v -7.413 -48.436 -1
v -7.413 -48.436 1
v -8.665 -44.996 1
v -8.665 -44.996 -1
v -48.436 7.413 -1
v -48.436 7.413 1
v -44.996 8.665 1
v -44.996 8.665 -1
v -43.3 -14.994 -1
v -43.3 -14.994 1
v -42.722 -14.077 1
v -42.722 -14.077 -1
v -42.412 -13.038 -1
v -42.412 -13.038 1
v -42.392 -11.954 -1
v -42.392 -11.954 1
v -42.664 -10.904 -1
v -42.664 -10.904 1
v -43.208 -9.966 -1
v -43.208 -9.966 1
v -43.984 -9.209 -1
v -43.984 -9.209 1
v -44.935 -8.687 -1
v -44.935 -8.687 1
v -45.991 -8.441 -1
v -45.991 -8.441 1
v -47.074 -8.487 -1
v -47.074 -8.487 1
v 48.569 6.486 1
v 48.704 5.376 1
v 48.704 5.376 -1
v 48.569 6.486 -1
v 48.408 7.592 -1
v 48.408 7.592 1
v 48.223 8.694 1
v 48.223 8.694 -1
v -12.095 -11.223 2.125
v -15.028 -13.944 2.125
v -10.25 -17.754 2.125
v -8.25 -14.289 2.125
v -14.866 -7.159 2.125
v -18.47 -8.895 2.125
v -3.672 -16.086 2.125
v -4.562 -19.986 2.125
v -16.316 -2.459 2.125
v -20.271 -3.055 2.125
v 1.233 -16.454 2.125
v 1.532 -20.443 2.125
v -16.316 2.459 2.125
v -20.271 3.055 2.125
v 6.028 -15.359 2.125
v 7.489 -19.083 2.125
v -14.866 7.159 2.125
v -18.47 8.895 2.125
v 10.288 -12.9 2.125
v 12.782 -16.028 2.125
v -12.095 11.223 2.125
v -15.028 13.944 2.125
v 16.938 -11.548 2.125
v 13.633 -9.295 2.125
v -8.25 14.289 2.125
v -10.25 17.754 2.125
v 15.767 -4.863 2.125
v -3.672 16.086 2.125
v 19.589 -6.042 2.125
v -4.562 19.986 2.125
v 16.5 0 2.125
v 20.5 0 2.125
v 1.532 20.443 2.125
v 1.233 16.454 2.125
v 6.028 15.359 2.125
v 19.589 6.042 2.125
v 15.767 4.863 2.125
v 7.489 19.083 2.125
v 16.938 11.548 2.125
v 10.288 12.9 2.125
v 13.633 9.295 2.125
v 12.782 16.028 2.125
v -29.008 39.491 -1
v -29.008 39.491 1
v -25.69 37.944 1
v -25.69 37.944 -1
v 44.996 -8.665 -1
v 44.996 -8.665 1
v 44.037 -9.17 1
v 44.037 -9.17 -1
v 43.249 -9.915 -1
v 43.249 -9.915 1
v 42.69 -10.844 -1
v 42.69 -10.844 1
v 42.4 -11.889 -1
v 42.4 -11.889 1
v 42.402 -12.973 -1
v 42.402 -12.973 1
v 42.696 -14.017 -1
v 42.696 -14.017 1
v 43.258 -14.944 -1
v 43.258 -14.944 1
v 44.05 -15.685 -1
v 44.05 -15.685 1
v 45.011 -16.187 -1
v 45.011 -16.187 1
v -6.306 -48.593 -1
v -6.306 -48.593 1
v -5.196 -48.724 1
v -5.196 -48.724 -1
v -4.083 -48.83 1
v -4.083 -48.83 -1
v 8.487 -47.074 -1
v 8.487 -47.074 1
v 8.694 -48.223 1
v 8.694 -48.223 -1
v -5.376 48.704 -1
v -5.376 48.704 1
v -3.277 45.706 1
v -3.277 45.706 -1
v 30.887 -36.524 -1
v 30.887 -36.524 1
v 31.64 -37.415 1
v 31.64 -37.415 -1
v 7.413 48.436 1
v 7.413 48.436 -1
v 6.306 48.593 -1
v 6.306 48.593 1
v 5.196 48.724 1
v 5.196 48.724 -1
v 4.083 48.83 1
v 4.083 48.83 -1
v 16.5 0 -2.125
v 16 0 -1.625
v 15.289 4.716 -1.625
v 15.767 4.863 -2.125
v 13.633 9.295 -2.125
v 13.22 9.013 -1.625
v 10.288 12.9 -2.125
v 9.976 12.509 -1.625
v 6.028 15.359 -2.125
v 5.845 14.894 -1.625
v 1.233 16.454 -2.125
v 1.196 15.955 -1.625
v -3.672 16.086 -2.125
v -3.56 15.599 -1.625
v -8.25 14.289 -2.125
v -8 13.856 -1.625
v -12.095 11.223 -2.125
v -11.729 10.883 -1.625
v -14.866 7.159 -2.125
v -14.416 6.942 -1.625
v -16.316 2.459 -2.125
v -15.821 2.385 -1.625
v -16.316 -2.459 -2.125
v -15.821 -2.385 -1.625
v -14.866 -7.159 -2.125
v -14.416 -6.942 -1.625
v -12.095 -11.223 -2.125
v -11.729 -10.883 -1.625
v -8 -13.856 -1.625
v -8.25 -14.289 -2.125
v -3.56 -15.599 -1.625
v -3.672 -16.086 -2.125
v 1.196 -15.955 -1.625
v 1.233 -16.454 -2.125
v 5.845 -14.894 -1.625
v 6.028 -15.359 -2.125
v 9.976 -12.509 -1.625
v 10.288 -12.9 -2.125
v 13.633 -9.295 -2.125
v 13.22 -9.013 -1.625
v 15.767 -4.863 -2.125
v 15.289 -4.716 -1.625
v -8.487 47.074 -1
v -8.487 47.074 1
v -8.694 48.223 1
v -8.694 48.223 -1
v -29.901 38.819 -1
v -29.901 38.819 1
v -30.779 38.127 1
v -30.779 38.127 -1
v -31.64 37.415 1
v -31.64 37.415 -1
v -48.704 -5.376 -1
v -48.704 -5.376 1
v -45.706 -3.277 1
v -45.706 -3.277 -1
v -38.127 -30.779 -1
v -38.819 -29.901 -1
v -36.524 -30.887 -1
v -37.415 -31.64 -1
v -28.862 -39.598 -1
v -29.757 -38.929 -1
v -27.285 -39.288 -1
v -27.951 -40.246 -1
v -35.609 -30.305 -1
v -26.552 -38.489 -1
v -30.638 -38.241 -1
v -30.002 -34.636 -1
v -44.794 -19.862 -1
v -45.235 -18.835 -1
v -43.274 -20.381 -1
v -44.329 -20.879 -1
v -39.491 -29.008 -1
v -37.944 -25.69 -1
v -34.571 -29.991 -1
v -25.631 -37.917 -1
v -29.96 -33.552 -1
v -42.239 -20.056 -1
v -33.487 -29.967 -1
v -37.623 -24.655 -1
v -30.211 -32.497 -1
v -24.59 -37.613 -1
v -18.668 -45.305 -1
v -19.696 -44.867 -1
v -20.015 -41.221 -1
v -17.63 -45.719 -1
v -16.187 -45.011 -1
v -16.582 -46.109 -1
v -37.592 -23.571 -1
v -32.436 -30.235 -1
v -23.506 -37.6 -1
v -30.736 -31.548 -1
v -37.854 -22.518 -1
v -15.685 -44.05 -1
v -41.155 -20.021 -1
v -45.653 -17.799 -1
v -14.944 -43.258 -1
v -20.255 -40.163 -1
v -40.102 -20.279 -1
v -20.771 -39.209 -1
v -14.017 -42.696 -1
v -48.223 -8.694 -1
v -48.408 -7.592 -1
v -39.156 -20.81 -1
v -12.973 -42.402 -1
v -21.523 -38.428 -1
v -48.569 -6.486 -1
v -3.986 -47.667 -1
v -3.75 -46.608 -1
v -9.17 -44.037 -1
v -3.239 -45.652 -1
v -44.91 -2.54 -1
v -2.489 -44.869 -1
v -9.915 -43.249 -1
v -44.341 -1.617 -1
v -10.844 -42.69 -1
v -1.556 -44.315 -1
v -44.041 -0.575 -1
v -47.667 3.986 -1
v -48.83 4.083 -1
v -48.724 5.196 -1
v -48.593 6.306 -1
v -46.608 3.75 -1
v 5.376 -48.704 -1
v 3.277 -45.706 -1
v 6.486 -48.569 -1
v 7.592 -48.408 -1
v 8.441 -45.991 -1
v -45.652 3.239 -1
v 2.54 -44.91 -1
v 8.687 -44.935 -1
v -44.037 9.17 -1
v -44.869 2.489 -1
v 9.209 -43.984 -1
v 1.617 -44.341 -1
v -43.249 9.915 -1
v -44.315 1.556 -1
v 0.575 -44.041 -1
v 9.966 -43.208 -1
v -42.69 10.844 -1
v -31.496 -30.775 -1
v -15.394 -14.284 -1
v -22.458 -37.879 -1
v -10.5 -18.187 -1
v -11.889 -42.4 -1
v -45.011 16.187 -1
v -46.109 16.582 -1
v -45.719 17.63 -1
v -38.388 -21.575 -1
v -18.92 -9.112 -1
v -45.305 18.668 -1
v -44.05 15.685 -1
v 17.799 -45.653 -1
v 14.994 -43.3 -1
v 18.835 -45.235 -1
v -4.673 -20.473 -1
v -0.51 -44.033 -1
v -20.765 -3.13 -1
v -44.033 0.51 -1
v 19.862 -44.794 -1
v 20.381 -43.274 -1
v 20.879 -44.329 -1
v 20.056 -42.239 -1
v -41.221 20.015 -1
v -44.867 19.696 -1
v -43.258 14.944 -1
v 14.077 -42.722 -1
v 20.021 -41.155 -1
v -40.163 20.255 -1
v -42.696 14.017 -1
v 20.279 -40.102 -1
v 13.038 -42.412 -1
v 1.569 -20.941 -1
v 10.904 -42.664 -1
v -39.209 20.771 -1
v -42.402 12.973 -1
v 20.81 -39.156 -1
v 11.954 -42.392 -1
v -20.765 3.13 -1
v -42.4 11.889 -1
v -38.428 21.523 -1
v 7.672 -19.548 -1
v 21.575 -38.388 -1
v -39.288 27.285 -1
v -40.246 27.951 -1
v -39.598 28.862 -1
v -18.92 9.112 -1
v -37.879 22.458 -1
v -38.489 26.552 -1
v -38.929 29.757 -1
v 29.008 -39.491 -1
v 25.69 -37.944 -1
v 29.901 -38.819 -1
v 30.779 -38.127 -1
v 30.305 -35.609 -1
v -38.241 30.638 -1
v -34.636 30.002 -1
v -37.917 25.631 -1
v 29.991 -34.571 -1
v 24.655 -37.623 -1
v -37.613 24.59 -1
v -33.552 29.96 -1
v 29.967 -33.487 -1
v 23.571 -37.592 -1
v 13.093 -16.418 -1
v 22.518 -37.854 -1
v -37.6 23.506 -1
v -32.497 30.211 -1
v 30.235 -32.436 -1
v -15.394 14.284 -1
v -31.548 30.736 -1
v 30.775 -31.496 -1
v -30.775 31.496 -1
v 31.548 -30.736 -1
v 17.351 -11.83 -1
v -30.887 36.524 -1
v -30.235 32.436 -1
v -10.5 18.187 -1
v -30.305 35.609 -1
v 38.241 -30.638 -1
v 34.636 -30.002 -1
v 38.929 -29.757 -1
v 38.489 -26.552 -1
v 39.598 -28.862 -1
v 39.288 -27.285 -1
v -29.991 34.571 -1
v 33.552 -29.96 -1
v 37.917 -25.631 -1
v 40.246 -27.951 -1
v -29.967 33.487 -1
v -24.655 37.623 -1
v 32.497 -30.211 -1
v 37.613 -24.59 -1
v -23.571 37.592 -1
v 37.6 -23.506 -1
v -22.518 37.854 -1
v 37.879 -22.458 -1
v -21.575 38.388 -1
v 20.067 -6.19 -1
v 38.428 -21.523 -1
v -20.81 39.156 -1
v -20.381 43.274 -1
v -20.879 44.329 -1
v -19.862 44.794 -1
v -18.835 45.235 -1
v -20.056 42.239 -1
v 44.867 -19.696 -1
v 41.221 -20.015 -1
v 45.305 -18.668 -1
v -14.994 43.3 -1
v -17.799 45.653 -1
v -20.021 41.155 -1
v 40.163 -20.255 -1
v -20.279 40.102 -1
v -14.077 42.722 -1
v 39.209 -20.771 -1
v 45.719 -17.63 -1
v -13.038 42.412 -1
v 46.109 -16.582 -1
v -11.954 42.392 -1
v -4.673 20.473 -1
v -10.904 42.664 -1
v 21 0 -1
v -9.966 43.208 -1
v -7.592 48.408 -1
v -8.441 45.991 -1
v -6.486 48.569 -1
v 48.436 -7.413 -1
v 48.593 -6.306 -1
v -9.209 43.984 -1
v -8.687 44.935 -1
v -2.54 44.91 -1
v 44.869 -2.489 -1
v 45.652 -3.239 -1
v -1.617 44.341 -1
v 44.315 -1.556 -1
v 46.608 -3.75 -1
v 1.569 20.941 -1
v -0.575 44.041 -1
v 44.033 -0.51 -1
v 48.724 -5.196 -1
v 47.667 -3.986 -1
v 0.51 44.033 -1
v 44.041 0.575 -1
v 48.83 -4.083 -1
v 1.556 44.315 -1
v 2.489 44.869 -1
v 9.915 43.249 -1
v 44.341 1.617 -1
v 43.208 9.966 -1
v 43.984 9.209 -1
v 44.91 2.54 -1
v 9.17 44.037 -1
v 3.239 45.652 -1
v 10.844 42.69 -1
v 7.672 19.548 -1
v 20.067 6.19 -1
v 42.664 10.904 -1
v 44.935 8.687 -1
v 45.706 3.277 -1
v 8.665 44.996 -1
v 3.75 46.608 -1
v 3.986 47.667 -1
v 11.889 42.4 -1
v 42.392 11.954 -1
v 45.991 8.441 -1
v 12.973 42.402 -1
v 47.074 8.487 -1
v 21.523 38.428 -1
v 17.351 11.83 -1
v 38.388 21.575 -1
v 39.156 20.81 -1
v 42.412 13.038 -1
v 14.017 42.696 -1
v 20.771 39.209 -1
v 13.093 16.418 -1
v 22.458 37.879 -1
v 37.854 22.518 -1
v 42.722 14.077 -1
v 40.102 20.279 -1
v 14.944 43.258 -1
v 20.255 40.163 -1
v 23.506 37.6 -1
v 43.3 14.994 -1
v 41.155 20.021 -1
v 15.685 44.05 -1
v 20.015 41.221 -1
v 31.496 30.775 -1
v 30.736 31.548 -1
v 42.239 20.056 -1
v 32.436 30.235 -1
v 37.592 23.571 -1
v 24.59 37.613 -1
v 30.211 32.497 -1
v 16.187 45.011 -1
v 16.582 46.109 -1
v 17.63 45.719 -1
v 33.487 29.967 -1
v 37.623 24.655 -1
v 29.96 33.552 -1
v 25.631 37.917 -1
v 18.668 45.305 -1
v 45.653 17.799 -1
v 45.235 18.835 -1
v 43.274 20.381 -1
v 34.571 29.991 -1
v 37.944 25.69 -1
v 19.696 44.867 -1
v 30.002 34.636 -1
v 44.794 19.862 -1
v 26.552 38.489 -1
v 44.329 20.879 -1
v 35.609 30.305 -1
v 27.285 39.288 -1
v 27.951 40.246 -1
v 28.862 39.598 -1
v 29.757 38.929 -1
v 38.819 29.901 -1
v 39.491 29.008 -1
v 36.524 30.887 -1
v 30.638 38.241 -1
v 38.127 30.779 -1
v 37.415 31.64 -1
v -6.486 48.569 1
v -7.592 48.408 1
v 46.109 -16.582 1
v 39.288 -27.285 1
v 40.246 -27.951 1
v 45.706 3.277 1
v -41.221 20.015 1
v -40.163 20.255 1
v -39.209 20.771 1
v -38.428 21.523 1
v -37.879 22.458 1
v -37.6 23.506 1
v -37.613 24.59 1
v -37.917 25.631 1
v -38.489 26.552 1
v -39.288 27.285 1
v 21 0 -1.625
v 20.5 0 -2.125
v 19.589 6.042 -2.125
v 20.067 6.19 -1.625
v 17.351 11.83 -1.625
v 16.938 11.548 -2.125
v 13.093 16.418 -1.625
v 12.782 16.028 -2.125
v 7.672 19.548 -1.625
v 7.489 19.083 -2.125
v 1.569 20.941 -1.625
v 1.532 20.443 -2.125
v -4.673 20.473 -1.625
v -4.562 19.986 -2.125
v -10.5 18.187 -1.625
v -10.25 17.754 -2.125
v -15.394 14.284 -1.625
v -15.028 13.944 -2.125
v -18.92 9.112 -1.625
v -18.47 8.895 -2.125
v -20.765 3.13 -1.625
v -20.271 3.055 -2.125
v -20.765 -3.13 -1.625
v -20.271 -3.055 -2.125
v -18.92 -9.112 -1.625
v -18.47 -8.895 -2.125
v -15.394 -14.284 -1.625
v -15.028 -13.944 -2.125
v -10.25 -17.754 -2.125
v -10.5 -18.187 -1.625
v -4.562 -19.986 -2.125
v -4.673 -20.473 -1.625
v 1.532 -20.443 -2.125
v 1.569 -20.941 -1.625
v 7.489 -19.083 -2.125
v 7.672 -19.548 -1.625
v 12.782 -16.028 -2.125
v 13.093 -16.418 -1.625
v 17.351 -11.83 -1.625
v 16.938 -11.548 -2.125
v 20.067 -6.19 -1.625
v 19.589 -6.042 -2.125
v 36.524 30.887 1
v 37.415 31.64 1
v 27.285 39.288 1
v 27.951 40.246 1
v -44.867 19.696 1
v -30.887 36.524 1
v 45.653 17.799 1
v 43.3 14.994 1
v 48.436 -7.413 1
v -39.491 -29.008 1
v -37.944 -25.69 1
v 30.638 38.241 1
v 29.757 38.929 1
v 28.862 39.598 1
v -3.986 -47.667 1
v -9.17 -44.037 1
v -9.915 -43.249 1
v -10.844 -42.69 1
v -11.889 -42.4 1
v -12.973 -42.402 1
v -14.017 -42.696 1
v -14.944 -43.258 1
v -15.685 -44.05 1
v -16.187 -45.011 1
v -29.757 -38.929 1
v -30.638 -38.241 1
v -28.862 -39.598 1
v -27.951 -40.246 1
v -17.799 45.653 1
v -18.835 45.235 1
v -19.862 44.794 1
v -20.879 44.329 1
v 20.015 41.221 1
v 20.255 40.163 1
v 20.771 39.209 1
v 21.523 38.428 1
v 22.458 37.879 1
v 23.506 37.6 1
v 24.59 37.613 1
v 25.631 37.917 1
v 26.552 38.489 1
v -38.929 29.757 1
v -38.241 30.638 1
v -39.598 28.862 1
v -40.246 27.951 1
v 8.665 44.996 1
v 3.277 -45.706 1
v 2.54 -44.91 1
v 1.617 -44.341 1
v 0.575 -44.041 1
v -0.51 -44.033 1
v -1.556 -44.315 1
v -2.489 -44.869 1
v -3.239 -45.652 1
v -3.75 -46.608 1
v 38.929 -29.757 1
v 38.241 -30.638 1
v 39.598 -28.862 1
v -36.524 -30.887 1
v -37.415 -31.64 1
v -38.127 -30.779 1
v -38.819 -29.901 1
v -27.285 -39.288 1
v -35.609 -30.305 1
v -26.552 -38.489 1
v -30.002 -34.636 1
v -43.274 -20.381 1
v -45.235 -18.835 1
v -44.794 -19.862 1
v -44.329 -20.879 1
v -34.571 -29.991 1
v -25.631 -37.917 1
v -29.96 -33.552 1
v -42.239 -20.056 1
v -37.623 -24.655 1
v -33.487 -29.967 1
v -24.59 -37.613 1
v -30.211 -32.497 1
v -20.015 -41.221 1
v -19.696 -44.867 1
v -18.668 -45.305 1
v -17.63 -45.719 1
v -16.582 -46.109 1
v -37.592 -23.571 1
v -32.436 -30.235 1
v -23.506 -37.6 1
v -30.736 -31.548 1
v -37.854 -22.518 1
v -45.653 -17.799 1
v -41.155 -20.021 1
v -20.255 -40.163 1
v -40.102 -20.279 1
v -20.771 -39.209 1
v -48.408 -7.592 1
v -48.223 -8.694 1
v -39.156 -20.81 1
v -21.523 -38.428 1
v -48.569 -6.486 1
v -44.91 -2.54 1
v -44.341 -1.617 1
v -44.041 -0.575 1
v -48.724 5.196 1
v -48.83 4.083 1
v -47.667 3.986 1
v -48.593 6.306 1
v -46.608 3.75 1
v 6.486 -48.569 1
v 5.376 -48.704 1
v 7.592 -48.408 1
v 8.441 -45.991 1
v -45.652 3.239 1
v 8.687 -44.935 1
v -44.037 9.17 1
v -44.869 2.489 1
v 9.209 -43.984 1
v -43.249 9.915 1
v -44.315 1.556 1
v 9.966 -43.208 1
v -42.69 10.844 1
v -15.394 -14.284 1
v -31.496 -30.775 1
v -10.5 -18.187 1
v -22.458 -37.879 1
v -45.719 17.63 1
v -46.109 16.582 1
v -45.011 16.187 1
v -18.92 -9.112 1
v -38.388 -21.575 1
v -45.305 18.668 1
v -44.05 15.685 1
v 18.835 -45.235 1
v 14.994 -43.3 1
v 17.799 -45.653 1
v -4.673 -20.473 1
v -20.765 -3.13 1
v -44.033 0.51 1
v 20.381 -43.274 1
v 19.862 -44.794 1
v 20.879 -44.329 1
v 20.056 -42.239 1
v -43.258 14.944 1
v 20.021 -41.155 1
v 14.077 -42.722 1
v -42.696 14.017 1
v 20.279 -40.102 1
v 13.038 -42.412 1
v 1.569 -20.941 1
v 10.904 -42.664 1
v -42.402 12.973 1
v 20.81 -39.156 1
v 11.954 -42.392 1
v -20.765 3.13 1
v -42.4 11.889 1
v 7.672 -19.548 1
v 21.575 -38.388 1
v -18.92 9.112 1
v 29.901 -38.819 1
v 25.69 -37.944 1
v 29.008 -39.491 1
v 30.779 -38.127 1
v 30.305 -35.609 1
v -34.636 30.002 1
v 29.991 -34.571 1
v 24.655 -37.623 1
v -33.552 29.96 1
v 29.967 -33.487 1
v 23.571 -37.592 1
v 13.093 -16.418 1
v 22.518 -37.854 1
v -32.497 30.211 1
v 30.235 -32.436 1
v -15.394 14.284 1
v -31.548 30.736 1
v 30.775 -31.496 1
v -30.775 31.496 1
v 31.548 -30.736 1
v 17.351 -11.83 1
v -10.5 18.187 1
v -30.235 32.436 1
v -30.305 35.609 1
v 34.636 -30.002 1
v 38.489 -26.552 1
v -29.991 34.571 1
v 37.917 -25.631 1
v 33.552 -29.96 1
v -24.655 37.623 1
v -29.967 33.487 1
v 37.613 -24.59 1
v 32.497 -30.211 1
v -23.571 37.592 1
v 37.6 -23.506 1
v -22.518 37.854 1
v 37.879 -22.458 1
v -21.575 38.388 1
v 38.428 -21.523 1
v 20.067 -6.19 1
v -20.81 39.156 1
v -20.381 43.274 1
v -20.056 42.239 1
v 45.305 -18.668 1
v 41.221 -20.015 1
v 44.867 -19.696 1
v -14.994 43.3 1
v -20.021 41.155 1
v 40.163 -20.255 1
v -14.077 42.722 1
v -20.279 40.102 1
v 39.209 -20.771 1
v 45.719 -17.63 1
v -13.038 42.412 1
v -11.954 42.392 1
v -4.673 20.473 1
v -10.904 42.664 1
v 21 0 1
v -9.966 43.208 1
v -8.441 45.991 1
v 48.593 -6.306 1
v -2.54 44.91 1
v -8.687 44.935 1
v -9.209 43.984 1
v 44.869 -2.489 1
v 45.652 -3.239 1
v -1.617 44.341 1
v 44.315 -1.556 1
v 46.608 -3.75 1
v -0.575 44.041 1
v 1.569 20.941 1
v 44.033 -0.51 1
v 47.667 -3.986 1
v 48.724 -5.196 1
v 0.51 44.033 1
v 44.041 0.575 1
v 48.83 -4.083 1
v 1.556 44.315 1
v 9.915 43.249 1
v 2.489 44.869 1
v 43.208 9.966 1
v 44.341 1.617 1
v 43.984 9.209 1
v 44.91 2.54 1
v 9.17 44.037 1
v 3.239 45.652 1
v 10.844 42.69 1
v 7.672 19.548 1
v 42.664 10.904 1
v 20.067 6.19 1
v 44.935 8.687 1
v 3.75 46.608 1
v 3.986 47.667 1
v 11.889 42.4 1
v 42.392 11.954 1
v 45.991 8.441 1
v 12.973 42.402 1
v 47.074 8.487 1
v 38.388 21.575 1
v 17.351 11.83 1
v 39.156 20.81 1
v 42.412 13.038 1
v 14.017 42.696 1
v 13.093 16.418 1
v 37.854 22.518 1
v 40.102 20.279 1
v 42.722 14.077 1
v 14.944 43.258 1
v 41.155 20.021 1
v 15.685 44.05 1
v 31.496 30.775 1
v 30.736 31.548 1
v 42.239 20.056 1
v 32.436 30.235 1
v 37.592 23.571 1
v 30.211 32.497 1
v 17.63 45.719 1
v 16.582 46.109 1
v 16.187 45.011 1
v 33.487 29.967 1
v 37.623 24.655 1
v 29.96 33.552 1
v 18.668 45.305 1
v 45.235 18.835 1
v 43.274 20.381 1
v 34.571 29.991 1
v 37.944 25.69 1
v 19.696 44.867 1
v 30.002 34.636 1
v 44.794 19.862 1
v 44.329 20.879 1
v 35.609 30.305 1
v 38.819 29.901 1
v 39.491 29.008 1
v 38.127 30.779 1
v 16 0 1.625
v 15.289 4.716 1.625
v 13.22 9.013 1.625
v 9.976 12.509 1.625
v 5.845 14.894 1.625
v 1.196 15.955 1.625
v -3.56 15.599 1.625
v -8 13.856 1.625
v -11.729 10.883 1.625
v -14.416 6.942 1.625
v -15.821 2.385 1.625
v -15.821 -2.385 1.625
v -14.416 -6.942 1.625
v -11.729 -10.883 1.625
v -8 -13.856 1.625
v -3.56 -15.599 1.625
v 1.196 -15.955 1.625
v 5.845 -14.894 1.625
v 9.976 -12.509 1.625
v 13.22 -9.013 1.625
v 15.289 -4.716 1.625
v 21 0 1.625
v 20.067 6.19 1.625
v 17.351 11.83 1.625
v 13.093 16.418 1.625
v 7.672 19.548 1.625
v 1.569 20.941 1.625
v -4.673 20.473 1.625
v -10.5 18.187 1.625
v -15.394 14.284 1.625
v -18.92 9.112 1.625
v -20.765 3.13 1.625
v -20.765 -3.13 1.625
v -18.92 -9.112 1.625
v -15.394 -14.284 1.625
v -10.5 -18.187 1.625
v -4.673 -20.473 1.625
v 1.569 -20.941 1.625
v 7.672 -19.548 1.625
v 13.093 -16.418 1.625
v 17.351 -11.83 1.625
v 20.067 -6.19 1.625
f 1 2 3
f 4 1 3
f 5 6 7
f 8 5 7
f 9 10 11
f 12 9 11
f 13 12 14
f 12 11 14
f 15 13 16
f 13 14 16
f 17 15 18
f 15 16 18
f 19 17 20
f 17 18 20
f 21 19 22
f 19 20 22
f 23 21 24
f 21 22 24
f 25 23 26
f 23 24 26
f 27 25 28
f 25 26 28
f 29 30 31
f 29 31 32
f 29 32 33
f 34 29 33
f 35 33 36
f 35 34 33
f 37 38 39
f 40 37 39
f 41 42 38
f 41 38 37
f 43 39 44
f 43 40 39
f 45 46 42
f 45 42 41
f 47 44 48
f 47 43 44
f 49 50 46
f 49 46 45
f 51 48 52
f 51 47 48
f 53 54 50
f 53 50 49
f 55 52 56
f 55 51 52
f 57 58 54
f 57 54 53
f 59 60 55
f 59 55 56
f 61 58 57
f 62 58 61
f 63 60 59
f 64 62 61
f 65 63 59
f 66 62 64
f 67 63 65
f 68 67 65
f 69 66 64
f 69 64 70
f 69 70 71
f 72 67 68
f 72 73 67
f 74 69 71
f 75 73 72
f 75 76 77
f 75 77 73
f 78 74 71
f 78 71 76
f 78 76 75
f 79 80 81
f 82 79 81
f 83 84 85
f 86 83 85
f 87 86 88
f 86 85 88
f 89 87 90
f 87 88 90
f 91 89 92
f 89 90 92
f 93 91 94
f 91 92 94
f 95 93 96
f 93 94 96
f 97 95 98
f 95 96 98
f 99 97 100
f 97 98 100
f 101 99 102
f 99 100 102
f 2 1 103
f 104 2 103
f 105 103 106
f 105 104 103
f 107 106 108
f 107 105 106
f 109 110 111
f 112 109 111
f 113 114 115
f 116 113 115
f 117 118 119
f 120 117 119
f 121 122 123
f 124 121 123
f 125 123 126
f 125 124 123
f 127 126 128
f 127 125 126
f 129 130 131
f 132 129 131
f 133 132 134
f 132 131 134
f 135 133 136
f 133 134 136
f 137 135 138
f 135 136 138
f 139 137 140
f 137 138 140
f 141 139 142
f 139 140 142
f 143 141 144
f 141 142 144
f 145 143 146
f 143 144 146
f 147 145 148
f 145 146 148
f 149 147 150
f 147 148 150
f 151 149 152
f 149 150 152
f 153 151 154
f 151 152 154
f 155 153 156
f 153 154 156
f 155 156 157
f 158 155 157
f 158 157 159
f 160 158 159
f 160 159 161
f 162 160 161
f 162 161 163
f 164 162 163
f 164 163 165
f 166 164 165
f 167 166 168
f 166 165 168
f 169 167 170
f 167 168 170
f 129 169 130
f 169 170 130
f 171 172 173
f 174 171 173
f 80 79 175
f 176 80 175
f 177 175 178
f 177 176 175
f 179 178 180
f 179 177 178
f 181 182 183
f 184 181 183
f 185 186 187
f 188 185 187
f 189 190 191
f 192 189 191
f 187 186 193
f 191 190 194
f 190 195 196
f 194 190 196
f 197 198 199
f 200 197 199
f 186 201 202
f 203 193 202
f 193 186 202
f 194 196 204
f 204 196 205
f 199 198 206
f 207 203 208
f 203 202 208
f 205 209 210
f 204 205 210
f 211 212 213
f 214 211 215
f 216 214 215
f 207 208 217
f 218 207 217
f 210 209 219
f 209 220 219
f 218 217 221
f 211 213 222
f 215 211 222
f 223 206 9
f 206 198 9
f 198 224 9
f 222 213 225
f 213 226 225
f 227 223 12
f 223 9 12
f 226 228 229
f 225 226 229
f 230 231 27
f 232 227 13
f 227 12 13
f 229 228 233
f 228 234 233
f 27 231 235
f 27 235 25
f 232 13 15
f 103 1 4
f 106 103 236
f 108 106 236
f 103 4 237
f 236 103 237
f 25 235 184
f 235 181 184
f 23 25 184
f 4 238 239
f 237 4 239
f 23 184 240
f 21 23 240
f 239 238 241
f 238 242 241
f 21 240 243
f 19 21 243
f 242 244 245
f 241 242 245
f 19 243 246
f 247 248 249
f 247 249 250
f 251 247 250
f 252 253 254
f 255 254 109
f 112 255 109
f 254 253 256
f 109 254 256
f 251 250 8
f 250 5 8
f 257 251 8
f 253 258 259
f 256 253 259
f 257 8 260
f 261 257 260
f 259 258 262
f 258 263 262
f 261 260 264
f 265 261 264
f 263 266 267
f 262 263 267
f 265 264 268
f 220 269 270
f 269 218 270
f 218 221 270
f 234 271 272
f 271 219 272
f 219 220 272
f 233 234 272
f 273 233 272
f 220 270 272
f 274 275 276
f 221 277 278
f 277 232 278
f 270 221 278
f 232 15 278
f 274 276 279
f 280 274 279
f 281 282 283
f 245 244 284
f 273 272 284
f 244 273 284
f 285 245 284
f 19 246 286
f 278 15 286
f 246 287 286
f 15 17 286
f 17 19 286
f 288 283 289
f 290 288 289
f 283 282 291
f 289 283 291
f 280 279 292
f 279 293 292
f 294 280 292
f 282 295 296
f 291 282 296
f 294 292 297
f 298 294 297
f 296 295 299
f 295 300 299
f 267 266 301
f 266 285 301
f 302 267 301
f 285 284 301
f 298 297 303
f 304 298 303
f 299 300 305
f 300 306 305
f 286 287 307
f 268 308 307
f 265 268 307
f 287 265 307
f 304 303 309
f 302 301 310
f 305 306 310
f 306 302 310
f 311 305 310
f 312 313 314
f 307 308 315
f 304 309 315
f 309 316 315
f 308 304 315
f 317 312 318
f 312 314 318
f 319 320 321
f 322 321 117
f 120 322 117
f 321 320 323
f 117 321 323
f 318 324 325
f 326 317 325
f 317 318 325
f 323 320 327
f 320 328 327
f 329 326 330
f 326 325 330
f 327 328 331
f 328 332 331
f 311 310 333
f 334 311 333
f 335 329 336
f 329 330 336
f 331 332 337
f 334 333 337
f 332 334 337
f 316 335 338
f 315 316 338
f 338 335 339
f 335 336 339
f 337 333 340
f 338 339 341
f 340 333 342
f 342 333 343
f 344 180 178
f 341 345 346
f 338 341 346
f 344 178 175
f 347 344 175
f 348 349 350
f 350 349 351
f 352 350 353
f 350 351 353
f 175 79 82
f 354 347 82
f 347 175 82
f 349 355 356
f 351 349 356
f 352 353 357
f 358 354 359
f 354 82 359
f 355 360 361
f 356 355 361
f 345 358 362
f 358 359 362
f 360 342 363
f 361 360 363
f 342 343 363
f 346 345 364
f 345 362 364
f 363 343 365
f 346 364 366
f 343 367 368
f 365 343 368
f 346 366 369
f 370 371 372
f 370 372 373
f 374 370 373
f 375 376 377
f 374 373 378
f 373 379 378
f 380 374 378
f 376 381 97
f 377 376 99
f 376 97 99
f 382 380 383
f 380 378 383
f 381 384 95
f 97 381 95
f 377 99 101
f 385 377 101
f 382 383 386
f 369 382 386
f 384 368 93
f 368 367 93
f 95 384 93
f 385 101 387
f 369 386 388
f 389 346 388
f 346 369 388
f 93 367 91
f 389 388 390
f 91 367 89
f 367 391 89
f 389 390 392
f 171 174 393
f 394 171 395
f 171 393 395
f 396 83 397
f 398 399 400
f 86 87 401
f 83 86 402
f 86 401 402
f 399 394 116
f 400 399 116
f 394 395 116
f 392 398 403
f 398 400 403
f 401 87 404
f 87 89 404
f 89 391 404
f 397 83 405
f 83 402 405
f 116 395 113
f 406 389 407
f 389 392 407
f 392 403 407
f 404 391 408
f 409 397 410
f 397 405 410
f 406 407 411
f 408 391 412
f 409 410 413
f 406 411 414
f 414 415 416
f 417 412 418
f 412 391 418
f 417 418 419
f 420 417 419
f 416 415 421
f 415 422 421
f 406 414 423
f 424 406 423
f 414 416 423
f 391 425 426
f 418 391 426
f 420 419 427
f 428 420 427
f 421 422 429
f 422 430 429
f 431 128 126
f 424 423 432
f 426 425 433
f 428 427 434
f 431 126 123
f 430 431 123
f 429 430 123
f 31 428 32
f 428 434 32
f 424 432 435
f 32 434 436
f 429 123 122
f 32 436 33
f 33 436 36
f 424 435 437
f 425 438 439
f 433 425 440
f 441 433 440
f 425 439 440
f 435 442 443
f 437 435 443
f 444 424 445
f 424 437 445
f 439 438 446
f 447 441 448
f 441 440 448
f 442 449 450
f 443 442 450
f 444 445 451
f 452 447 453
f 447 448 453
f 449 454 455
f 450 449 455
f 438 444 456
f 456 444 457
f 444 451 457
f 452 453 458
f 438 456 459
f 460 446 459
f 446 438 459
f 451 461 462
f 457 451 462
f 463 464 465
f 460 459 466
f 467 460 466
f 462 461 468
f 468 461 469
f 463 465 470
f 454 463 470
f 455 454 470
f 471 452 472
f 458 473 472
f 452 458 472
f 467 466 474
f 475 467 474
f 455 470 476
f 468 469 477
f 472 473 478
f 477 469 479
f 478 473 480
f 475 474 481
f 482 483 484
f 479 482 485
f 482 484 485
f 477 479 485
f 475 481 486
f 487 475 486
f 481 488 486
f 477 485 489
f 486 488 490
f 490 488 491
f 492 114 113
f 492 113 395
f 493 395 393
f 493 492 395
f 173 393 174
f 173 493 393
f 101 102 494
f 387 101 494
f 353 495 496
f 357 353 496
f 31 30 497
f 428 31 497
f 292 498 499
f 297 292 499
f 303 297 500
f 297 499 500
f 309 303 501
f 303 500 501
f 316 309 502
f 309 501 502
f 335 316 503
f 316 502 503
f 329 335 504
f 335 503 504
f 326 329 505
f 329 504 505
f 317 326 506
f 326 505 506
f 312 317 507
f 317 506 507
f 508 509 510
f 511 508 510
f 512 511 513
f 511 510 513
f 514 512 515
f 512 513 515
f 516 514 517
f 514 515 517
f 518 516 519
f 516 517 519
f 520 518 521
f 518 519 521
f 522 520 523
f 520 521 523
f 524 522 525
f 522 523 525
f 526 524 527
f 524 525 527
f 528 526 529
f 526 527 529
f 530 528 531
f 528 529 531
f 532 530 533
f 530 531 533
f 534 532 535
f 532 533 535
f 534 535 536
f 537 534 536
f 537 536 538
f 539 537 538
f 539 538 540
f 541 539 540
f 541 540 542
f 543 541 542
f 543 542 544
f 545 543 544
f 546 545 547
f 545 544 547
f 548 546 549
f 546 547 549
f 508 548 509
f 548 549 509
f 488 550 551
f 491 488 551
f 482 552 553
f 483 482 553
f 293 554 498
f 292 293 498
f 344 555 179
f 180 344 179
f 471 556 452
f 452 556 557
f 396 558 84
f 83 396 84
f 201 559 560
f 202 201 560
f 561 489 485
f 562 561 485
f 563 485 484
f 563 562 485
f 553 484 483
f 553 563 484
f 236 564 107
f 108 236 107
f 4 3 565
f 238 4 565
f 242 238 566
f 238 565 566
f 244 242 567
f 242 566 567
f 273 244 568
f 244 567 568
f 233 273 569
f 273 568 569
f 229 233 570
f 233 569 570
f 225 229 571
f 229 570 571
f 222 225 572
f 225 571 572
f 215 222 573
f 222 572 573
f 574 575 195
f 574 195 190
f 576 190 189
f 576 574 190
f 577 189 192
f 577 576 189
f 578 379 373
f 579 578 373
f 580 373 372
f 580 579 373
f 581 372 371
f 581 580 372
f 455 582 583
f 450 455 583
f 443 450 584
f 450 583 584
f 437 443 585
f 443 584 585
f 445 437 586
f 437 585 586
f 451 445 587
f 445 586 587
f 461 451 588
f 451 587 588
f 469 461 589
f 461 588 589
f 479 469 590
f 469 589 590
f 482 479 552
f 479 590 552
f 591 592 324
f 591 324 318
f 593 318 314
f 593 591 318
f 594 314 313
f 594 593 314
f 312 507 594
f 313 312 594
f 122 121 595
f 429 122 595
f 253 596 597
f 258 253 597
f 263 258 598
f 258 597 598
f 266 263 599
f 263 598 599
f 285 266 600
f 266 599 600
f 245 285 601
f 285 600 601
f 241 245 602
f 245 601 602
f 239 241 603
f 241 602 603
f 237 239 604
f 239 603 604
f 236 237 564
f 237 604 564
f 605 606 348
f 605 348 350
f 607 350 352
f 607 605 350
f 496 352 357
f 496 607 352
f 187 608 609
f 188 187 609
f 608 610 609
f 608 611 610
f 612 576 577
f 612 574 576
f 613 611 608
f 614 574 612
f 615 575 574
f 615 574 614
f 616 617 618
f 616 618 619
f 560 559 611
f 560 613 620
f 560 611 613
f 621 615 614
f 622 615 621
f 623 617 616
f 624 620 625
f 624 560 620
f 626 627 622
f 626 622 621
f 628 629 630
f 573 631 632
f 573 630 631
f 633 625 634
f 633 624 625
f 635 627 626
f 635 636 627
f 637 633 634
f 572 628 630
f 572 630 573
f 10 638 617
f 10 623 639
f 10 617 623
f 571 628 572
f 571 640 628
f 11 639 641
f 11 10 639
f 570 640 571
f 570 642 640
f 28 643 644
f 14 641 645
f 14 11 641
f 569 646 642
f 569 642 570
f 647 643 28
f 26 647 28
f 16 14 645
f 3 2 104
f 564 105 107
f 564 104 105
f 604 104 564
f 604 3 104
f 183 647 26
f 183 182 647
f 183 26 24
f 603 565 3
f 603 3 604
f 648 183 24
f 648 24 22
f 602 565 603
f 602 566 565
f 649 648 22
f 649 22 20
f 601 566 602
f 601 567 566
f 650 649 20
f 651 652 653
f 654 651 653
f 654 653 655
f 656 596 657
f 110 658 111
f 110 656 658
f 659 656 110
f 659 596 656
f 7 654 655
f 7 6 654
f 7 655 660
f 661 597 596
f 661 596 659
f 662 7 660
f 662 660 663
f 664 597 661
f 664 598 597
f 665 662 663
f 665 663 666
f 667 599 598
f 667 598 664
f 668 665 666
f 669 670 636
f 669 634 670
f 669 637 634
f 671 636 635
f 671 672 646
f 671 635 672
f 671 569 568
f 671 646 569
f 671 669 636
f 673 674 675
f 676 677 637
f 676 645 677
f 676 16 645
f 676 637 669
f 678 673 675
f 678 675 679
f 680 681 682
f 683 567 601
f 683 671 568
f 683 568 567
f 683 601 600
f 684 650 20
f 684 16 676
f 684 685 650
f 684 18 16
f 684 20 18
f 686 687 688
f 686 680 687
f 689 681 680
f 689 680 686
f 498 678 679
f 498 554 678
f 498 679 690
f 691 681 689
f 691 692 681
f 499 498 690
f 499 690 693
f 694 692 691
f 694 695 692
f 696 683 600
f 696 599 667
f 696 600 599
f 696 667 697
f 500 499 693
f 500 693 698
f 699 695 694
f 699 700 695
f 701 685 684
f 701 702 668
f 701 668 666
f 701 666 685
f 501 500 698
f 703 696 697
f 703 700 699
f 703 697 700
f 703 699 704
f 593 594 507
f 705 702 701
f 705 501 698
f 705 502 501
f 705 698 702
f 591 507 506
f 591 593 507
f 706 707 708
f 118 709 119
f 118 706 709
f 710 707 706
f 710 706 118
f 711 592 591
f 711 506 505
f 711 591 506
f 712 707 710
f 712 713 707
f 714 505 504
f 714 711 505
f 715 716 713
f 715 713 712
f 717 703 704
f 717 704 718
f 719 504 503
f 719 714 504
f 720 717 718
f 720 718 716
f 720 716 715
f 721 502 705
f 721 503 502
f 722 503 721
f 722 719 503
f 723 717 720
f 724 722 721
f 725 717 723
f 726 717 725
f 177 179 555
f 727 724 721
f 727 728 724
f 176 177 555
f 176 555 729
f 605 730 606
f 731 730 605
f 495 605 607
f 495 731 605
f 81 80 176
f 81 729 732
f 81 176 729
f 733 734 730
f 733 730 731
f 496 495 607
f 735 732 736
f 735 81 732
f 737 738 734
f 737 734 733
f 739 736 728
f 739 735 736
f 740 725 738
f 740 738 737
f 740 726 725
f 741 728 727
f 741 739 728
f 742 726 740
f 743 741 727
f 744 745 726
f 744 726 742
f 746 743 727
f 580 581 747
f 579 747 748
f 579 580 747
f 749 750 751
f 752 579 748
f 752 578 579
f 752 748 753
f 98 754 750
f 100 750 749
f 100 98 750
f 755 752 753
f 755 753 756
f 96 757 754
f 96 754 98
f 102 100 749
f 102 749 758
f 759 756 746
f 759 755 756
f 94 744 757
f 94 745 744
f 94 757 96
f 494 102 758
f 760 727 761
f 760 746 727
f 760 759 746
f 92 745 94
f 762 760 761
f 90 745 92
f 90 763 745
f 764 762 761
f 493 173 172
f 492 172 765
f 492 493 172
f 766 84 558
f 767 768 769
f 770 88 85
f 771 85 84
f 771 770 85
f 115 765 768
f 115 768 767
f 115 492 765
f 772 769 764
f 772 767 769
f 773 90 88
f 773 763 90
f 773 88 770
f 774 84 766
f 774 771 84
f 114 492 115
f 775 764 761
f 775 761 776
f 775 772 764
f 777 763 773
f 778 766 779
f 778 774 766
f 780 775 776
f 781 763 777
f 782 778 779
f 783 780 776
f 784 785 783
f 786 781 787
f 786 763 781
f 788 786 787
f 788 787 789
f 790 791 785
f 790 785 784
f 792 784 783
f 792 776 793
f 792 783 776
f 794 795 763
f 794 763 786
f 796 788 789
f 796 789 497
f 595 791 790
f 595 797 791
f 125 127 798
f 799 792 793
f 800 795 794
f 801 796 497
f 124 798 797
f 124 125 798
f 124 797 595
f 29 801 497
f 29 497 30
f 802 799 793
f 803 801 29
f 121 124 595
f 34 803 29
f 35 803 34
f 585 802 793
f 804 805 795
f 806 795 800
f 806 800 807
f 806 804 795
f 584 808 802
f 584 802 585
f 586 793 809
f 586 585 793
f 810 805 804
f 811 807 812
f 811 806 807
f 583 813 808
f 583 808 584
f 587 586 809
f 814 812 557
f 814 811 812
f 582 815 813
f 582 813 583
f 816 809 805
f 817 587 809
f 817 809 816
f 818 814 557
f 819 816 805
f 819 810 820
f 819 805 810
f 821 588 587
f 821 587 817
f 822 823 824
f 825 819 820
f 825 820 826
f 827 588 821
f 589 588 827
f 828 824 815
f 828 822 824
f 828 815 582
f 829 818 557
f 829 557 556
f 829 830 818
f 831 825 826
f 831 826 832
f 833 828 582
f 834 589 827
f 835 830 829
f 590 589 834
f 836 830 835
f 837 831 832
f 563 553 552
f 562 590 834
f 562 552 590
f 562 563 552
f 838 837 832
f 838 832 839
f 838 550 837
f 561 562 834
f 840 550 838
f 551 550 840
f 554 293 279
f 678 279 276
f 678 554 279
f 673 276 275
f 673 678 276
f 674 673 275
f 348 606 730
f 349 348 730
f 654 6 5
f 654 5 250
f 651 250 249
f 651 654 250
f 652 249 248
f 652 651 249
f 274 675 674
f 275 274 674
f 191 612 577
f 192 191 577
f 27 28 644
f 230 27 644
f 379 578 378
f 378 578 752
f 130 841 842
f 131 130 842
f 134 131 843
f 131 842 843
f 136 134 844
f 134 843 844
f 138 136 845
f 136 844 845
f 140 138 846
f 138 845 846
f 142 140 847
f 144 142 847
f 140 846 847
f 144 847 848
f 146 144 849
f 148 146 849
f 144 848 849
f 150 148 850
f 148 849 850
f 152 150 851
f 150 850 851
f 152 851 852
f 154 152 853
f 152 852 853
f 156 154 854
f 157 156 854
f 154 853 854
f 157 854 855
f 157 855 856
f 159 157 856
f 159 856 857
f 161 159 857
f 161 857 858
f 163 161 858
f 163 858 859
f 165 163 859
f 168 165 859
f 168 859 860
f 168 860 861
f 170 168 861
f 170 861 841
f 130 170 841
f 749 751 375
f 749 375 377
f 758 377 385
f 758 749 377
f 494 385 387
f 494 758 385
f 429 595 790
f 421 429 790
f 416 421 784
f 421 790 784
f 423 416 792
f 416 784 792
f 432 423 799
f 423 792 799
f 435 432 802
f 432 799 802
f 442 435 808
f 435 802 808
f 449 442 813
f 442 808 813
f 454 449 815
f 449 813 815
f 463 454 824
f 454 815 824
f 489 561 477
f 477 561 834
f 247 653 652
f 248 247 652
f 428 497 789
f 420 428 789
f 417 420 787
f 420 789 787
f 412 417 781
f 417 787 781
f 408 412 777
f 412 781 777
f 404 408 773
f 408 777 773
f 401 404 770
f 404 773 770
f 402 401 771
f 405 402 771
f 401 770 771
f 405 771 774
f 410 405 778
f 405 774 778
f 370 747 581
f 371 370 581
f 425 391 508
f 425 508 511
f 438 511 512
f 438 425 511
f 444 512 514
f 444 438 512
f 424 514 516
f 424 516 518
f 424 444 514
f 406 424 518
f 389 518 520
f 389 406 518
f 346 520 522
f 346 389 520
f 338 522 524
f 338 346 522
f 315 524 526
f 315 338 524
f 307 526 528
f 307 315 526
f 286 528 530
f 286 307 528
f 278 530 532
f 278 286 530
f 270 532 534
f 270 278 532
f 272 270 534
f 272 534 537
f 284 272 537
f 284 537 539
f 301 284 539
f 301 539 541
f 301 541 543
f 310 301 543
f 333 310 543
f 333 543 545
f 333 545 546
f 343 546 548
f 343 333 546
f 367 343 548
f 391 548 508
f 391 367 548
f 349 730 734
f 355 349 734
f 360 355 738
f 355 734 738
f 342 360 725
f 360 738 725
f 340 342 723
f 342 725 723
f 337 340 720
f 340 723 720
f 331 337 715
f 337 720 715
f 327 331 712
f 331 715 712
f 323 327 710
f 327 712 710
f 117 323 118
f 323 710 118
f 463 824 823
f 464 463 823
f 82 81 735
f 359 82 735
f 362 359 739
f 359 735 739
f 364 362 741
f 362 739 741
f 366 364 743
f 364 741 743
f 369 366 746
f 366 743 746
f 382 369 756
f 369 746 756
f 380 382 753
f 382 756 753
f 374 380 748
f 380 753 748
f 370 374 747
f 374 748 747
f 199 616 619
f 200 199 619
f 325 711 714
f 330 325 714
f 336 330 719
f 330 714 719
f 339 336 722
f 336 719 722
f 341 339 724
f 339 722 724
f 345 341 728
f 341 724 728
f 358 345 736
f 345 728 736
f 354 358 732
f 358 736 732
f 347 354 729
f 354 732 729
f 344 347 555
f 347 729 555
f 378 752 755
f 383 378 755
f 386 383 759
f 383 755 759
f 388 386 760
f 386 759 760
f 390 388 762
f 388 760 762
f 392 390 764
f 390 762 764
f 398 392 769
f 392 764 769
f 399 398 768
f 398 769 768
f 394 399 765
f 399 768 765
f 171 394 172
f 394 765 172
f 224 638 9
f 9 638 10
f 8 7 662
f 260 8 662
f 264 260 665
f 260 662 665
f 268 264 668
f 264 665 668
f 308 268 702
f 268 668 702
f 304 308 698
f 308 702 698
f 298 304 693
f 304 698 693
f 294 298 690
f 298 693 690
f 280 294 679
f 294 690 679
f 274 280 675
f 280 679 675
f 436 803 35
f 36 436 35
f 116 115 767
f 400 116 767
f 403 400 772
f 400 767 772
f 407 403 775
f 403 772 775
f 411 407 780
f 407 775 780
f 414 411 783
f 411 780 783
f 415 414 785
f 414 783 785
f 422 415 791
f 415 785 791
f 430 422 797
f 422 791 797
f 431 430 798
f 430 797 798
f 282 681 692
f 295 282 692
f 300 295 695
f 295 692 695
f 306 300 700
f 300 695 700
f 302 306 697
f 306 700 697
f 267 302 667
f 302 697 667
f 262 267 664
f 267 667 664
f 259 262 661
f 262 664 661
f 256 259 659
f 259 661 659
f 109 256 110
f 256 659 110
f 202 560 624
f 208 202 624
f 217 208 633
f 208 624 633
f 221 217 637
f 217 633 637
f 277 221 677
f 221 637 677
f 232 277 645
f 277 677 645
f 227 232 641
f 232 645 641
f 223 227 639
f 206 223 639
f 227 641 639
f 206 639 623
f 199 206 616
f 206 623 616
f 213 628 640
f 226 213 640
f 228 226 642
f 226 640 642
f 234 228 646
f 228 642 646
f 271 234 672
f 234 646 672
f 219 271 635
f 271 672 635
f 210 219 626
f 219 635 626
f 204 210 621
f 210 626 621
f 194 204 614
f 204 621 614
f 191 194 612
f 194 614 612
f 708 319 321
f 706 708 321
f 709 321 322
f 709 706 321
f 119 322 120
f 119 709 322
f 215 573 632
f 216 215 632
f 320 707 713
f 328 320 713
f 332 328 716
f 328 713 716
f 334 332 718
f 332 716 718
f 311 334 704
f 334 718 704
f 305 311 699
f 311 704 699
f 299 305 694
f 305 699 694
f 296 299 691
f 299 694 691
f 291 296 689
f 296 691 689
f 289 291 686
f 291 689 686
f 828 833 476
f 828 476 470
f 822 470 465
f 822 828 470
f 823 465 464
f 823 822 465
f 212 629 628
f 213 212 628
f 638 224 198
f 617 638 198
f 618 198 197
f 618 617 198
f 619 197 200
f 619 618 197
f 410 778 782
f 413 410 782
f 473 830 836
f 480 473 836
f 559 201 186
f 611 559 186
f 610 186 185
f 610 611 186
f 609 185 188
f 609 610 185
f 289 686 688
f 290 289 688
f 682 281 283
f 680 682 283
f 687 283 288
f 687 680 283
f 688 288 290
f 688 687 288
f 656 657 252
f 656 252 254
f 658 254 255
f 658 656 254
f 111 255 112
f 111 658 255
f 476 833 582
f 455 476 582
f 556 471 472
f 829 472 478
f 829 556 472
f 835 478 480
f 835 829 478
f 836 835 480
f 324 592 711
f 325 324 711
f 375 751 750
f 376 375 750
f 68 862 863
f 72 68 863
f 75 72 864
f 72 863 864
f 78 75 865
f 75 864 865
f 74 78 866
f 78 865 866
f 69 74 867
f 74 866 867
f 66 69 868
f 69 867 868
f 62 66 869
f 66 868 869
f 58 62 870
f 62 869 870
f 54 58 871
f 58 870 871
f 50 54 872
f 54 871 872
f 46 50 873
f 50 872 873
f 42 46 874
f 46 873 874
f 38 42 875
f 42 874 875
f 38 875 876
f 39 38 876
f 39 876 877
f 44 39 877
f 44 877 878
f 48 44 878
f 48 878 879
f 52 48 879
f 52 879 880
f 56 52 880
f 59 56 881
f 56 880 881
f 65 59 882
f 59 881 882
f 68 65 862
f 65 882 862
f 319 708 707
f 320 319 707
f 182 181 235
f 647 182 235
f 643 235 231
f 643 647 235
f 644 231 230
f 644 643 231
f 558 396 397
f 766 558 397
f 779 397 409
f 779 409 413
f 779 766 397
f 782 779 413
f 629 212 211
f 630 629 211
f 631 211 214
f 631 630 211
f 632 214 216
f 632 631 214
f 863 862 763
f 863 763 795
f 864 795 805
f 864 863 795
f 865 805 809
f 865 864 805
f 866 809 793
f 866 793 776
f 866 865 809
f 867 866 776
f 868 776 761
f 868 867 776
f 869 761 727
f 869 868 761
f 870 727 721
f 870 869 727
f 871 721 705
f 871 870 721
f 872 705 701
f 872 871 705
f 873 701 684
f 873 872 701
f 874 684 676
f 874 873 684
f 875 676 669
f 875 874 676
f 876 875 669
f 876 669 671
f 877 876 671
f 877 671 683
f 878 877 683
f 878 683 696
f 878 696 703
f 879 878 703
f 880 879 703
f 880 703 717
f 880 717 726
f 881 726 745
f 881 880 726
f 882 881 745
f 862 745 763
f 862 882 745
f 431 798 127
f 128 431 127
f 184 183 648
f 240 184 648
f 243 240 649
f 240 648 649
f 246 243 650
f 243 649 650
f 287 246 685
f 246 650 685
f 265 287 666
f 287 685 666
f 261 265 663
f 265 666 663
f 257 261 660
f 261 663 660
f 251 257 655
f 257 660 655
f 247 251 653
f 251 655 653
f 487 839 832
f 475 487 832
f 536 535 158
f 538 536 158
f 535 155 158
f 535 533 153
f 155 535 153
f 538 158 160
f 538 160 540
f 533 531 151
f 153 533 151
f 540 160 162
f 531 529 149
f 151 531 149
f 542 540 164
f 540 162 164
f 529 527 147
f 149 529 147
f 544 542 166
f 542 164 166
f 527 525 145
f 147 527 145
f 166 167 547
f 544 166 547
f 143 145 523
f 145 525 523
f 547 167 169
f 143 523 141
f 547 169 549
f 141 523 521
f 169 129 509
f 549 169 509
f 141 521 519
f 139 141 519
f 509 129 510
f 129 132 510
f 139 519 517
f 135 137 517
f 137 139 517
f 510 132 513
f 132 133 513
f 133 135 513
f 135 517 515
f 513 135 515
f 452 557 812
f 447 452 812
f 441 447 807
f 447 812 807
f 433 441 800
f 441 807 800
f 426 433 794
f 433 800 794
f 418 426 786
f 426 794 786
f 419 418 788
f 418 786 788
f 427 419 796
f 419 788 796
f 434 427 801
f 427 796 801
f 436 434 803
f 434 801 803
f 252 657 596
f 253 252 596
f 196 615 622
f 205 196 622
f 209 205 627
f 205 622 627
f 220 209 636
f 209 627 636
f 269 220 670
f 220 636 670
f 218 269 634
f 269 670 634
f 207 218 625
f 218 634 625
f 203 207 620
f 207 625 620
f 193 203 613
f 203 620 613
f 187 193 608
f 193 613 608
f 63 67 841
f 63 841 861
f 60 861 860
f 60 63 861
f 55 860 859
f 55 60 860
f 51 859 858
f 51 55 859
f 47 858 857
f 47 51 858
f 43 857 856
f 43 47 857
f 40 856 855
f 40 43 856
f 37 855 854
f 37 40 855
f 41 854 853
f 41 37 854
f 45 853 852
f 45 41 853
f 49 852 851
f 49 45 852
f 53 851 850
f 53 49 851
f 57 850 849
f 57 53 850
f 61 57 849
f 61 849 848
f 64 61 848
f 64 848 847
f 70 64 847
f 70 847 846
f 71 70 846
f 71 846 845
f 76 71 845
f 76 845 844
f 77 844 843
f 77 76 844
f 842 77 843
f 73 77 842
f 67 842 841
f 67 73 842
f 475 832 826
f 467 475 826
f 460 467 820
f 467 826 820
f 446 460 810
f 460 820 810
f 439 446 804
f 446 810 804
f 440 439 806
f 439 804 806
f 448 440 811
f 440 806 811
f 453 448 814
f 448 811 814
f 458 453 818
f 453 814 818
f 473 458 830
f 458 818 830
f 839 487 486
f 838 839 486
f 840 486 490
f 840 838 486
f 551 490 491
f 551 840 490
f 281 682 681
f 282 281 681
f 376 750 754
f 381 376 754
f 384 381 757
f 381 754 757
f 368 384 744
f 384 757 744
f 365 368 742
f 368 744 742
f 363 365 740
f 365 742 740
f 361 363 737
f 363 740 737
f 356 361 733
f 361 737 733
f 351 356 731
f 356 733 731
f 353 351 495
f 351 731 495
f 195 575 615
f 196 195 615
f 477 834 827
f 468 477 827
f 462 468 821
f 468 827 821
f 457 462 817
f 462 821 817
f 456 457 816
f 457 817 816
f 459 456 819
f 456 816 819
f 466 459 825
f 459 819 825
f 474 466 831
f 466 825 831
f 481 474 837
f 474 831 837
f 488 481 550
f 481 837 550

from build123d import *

# Parameters (mm, degrees)
ESQUISSE1_R                  = 49
EXTRUSION1_DEPTH             = 1
ENL_V_MAT_EXTRU_1_DEPTH      = 2
R_P_TITION_CIRCULAIRE1_COUNT = 24
ESQUISSE3_R                  = 21
EXTRUSION2_DEPTH             = 2.125
ESQUISSE4_R                  = 16
ENL_V_MAT_EXTRU_2_DEPTH      = 3.125
ENL_V_MAT_EXTRU_2_DEPTH_BACK = 3.125
CHANFREIN1_SIZE              = 0.5


with BuildPart() as part:
    # Esquisse1 → Extrusion1 (new body, symmetric)
    with BuildSketch(Plane.XY):
        Circle(ESQUISSE1_R)
    extrude(amount=EXTRUSION1_DEPTH, both=True)

    # Esquisse2 → Enlèv. mat.-Extru.1 (cut, symmetric)
    with BuildSketch(Plane.XY):
        with BuildLine():
            Line((-5.376168106, 48.704176582), (-3.276608177, 45.705694255))
            ThreePointArc((-3.276608177, 45.705694255), (1.042685581, 44.138289656), (3.986086914, 47.666666667))
            Line((3.986086914, 47.666666667), (4.083333333, 48.829564701))
            ThreePointArc((4.083333333, 48.829564701), (-0.649450523, 48.995695872), (-5.376168106, 48.704176582))
        make_face()
    enl_v_mat_extru_1 = extrude(amount=ENL_V_MAT_EXTRU_1_DEPTH, both=True, mode=Mode.SUBTRACT)

    # Répétition circulaire1: Enlèv. mat.-Extru.1 ×24 about axis
    r_p_tition_circulaire1_axis = Axis((0, 0, 0), (0, 0, 1))
    for i in range(1, R_P_TITION_CIRCULAIRE1_COUNT):
        add(enl_v_mat_extru_1.rotate(r_p_tition_circulaire1_axis, i * 360 / R_P_TITION_CIRCULAIRE1_COUNT), mode=Mode.SUBTRACT)

    # Esquisse3 → Extrusion2 (add, symmetric)
    with BuildSketch(Plane.XY):
        Circle(ESQUISSE3_R)
    extrude(amount=EXTRUSION2_DEPTH, both=True)

    # Esquisse4 → Enlèv. mat.-Extru.2 (cut, two sides)
    with BuildSketch(Plane.XY) as enl_v_mat_extru_2_sk:
        Circle(ESQUISSE4_R)
    extrude(amount=ENL_V_MAT_EXTRU_2_DEPTH, mode=Mode.SUBTRACT)
    extrude(enl_v_mat_extru_2_sk.sketch, amount=-ENL_V_MAT_EXTRU_2_DEPTH_BACK, mode=Mode.SUBTRACT)

    # Chanfrein1
    chanfrein1_edges = [part.edges().sort_by_distance(p)[0] for p in [
        (-21, 0, -2.125),
        (-21, 0, 2.125),
        (-16, 0, -2.125),
        (-16, 0, 2.125),
    ]]
    chamfer(chanfrein1_edges, length=CHANFREIN1_SIZE)


solid = part.part
